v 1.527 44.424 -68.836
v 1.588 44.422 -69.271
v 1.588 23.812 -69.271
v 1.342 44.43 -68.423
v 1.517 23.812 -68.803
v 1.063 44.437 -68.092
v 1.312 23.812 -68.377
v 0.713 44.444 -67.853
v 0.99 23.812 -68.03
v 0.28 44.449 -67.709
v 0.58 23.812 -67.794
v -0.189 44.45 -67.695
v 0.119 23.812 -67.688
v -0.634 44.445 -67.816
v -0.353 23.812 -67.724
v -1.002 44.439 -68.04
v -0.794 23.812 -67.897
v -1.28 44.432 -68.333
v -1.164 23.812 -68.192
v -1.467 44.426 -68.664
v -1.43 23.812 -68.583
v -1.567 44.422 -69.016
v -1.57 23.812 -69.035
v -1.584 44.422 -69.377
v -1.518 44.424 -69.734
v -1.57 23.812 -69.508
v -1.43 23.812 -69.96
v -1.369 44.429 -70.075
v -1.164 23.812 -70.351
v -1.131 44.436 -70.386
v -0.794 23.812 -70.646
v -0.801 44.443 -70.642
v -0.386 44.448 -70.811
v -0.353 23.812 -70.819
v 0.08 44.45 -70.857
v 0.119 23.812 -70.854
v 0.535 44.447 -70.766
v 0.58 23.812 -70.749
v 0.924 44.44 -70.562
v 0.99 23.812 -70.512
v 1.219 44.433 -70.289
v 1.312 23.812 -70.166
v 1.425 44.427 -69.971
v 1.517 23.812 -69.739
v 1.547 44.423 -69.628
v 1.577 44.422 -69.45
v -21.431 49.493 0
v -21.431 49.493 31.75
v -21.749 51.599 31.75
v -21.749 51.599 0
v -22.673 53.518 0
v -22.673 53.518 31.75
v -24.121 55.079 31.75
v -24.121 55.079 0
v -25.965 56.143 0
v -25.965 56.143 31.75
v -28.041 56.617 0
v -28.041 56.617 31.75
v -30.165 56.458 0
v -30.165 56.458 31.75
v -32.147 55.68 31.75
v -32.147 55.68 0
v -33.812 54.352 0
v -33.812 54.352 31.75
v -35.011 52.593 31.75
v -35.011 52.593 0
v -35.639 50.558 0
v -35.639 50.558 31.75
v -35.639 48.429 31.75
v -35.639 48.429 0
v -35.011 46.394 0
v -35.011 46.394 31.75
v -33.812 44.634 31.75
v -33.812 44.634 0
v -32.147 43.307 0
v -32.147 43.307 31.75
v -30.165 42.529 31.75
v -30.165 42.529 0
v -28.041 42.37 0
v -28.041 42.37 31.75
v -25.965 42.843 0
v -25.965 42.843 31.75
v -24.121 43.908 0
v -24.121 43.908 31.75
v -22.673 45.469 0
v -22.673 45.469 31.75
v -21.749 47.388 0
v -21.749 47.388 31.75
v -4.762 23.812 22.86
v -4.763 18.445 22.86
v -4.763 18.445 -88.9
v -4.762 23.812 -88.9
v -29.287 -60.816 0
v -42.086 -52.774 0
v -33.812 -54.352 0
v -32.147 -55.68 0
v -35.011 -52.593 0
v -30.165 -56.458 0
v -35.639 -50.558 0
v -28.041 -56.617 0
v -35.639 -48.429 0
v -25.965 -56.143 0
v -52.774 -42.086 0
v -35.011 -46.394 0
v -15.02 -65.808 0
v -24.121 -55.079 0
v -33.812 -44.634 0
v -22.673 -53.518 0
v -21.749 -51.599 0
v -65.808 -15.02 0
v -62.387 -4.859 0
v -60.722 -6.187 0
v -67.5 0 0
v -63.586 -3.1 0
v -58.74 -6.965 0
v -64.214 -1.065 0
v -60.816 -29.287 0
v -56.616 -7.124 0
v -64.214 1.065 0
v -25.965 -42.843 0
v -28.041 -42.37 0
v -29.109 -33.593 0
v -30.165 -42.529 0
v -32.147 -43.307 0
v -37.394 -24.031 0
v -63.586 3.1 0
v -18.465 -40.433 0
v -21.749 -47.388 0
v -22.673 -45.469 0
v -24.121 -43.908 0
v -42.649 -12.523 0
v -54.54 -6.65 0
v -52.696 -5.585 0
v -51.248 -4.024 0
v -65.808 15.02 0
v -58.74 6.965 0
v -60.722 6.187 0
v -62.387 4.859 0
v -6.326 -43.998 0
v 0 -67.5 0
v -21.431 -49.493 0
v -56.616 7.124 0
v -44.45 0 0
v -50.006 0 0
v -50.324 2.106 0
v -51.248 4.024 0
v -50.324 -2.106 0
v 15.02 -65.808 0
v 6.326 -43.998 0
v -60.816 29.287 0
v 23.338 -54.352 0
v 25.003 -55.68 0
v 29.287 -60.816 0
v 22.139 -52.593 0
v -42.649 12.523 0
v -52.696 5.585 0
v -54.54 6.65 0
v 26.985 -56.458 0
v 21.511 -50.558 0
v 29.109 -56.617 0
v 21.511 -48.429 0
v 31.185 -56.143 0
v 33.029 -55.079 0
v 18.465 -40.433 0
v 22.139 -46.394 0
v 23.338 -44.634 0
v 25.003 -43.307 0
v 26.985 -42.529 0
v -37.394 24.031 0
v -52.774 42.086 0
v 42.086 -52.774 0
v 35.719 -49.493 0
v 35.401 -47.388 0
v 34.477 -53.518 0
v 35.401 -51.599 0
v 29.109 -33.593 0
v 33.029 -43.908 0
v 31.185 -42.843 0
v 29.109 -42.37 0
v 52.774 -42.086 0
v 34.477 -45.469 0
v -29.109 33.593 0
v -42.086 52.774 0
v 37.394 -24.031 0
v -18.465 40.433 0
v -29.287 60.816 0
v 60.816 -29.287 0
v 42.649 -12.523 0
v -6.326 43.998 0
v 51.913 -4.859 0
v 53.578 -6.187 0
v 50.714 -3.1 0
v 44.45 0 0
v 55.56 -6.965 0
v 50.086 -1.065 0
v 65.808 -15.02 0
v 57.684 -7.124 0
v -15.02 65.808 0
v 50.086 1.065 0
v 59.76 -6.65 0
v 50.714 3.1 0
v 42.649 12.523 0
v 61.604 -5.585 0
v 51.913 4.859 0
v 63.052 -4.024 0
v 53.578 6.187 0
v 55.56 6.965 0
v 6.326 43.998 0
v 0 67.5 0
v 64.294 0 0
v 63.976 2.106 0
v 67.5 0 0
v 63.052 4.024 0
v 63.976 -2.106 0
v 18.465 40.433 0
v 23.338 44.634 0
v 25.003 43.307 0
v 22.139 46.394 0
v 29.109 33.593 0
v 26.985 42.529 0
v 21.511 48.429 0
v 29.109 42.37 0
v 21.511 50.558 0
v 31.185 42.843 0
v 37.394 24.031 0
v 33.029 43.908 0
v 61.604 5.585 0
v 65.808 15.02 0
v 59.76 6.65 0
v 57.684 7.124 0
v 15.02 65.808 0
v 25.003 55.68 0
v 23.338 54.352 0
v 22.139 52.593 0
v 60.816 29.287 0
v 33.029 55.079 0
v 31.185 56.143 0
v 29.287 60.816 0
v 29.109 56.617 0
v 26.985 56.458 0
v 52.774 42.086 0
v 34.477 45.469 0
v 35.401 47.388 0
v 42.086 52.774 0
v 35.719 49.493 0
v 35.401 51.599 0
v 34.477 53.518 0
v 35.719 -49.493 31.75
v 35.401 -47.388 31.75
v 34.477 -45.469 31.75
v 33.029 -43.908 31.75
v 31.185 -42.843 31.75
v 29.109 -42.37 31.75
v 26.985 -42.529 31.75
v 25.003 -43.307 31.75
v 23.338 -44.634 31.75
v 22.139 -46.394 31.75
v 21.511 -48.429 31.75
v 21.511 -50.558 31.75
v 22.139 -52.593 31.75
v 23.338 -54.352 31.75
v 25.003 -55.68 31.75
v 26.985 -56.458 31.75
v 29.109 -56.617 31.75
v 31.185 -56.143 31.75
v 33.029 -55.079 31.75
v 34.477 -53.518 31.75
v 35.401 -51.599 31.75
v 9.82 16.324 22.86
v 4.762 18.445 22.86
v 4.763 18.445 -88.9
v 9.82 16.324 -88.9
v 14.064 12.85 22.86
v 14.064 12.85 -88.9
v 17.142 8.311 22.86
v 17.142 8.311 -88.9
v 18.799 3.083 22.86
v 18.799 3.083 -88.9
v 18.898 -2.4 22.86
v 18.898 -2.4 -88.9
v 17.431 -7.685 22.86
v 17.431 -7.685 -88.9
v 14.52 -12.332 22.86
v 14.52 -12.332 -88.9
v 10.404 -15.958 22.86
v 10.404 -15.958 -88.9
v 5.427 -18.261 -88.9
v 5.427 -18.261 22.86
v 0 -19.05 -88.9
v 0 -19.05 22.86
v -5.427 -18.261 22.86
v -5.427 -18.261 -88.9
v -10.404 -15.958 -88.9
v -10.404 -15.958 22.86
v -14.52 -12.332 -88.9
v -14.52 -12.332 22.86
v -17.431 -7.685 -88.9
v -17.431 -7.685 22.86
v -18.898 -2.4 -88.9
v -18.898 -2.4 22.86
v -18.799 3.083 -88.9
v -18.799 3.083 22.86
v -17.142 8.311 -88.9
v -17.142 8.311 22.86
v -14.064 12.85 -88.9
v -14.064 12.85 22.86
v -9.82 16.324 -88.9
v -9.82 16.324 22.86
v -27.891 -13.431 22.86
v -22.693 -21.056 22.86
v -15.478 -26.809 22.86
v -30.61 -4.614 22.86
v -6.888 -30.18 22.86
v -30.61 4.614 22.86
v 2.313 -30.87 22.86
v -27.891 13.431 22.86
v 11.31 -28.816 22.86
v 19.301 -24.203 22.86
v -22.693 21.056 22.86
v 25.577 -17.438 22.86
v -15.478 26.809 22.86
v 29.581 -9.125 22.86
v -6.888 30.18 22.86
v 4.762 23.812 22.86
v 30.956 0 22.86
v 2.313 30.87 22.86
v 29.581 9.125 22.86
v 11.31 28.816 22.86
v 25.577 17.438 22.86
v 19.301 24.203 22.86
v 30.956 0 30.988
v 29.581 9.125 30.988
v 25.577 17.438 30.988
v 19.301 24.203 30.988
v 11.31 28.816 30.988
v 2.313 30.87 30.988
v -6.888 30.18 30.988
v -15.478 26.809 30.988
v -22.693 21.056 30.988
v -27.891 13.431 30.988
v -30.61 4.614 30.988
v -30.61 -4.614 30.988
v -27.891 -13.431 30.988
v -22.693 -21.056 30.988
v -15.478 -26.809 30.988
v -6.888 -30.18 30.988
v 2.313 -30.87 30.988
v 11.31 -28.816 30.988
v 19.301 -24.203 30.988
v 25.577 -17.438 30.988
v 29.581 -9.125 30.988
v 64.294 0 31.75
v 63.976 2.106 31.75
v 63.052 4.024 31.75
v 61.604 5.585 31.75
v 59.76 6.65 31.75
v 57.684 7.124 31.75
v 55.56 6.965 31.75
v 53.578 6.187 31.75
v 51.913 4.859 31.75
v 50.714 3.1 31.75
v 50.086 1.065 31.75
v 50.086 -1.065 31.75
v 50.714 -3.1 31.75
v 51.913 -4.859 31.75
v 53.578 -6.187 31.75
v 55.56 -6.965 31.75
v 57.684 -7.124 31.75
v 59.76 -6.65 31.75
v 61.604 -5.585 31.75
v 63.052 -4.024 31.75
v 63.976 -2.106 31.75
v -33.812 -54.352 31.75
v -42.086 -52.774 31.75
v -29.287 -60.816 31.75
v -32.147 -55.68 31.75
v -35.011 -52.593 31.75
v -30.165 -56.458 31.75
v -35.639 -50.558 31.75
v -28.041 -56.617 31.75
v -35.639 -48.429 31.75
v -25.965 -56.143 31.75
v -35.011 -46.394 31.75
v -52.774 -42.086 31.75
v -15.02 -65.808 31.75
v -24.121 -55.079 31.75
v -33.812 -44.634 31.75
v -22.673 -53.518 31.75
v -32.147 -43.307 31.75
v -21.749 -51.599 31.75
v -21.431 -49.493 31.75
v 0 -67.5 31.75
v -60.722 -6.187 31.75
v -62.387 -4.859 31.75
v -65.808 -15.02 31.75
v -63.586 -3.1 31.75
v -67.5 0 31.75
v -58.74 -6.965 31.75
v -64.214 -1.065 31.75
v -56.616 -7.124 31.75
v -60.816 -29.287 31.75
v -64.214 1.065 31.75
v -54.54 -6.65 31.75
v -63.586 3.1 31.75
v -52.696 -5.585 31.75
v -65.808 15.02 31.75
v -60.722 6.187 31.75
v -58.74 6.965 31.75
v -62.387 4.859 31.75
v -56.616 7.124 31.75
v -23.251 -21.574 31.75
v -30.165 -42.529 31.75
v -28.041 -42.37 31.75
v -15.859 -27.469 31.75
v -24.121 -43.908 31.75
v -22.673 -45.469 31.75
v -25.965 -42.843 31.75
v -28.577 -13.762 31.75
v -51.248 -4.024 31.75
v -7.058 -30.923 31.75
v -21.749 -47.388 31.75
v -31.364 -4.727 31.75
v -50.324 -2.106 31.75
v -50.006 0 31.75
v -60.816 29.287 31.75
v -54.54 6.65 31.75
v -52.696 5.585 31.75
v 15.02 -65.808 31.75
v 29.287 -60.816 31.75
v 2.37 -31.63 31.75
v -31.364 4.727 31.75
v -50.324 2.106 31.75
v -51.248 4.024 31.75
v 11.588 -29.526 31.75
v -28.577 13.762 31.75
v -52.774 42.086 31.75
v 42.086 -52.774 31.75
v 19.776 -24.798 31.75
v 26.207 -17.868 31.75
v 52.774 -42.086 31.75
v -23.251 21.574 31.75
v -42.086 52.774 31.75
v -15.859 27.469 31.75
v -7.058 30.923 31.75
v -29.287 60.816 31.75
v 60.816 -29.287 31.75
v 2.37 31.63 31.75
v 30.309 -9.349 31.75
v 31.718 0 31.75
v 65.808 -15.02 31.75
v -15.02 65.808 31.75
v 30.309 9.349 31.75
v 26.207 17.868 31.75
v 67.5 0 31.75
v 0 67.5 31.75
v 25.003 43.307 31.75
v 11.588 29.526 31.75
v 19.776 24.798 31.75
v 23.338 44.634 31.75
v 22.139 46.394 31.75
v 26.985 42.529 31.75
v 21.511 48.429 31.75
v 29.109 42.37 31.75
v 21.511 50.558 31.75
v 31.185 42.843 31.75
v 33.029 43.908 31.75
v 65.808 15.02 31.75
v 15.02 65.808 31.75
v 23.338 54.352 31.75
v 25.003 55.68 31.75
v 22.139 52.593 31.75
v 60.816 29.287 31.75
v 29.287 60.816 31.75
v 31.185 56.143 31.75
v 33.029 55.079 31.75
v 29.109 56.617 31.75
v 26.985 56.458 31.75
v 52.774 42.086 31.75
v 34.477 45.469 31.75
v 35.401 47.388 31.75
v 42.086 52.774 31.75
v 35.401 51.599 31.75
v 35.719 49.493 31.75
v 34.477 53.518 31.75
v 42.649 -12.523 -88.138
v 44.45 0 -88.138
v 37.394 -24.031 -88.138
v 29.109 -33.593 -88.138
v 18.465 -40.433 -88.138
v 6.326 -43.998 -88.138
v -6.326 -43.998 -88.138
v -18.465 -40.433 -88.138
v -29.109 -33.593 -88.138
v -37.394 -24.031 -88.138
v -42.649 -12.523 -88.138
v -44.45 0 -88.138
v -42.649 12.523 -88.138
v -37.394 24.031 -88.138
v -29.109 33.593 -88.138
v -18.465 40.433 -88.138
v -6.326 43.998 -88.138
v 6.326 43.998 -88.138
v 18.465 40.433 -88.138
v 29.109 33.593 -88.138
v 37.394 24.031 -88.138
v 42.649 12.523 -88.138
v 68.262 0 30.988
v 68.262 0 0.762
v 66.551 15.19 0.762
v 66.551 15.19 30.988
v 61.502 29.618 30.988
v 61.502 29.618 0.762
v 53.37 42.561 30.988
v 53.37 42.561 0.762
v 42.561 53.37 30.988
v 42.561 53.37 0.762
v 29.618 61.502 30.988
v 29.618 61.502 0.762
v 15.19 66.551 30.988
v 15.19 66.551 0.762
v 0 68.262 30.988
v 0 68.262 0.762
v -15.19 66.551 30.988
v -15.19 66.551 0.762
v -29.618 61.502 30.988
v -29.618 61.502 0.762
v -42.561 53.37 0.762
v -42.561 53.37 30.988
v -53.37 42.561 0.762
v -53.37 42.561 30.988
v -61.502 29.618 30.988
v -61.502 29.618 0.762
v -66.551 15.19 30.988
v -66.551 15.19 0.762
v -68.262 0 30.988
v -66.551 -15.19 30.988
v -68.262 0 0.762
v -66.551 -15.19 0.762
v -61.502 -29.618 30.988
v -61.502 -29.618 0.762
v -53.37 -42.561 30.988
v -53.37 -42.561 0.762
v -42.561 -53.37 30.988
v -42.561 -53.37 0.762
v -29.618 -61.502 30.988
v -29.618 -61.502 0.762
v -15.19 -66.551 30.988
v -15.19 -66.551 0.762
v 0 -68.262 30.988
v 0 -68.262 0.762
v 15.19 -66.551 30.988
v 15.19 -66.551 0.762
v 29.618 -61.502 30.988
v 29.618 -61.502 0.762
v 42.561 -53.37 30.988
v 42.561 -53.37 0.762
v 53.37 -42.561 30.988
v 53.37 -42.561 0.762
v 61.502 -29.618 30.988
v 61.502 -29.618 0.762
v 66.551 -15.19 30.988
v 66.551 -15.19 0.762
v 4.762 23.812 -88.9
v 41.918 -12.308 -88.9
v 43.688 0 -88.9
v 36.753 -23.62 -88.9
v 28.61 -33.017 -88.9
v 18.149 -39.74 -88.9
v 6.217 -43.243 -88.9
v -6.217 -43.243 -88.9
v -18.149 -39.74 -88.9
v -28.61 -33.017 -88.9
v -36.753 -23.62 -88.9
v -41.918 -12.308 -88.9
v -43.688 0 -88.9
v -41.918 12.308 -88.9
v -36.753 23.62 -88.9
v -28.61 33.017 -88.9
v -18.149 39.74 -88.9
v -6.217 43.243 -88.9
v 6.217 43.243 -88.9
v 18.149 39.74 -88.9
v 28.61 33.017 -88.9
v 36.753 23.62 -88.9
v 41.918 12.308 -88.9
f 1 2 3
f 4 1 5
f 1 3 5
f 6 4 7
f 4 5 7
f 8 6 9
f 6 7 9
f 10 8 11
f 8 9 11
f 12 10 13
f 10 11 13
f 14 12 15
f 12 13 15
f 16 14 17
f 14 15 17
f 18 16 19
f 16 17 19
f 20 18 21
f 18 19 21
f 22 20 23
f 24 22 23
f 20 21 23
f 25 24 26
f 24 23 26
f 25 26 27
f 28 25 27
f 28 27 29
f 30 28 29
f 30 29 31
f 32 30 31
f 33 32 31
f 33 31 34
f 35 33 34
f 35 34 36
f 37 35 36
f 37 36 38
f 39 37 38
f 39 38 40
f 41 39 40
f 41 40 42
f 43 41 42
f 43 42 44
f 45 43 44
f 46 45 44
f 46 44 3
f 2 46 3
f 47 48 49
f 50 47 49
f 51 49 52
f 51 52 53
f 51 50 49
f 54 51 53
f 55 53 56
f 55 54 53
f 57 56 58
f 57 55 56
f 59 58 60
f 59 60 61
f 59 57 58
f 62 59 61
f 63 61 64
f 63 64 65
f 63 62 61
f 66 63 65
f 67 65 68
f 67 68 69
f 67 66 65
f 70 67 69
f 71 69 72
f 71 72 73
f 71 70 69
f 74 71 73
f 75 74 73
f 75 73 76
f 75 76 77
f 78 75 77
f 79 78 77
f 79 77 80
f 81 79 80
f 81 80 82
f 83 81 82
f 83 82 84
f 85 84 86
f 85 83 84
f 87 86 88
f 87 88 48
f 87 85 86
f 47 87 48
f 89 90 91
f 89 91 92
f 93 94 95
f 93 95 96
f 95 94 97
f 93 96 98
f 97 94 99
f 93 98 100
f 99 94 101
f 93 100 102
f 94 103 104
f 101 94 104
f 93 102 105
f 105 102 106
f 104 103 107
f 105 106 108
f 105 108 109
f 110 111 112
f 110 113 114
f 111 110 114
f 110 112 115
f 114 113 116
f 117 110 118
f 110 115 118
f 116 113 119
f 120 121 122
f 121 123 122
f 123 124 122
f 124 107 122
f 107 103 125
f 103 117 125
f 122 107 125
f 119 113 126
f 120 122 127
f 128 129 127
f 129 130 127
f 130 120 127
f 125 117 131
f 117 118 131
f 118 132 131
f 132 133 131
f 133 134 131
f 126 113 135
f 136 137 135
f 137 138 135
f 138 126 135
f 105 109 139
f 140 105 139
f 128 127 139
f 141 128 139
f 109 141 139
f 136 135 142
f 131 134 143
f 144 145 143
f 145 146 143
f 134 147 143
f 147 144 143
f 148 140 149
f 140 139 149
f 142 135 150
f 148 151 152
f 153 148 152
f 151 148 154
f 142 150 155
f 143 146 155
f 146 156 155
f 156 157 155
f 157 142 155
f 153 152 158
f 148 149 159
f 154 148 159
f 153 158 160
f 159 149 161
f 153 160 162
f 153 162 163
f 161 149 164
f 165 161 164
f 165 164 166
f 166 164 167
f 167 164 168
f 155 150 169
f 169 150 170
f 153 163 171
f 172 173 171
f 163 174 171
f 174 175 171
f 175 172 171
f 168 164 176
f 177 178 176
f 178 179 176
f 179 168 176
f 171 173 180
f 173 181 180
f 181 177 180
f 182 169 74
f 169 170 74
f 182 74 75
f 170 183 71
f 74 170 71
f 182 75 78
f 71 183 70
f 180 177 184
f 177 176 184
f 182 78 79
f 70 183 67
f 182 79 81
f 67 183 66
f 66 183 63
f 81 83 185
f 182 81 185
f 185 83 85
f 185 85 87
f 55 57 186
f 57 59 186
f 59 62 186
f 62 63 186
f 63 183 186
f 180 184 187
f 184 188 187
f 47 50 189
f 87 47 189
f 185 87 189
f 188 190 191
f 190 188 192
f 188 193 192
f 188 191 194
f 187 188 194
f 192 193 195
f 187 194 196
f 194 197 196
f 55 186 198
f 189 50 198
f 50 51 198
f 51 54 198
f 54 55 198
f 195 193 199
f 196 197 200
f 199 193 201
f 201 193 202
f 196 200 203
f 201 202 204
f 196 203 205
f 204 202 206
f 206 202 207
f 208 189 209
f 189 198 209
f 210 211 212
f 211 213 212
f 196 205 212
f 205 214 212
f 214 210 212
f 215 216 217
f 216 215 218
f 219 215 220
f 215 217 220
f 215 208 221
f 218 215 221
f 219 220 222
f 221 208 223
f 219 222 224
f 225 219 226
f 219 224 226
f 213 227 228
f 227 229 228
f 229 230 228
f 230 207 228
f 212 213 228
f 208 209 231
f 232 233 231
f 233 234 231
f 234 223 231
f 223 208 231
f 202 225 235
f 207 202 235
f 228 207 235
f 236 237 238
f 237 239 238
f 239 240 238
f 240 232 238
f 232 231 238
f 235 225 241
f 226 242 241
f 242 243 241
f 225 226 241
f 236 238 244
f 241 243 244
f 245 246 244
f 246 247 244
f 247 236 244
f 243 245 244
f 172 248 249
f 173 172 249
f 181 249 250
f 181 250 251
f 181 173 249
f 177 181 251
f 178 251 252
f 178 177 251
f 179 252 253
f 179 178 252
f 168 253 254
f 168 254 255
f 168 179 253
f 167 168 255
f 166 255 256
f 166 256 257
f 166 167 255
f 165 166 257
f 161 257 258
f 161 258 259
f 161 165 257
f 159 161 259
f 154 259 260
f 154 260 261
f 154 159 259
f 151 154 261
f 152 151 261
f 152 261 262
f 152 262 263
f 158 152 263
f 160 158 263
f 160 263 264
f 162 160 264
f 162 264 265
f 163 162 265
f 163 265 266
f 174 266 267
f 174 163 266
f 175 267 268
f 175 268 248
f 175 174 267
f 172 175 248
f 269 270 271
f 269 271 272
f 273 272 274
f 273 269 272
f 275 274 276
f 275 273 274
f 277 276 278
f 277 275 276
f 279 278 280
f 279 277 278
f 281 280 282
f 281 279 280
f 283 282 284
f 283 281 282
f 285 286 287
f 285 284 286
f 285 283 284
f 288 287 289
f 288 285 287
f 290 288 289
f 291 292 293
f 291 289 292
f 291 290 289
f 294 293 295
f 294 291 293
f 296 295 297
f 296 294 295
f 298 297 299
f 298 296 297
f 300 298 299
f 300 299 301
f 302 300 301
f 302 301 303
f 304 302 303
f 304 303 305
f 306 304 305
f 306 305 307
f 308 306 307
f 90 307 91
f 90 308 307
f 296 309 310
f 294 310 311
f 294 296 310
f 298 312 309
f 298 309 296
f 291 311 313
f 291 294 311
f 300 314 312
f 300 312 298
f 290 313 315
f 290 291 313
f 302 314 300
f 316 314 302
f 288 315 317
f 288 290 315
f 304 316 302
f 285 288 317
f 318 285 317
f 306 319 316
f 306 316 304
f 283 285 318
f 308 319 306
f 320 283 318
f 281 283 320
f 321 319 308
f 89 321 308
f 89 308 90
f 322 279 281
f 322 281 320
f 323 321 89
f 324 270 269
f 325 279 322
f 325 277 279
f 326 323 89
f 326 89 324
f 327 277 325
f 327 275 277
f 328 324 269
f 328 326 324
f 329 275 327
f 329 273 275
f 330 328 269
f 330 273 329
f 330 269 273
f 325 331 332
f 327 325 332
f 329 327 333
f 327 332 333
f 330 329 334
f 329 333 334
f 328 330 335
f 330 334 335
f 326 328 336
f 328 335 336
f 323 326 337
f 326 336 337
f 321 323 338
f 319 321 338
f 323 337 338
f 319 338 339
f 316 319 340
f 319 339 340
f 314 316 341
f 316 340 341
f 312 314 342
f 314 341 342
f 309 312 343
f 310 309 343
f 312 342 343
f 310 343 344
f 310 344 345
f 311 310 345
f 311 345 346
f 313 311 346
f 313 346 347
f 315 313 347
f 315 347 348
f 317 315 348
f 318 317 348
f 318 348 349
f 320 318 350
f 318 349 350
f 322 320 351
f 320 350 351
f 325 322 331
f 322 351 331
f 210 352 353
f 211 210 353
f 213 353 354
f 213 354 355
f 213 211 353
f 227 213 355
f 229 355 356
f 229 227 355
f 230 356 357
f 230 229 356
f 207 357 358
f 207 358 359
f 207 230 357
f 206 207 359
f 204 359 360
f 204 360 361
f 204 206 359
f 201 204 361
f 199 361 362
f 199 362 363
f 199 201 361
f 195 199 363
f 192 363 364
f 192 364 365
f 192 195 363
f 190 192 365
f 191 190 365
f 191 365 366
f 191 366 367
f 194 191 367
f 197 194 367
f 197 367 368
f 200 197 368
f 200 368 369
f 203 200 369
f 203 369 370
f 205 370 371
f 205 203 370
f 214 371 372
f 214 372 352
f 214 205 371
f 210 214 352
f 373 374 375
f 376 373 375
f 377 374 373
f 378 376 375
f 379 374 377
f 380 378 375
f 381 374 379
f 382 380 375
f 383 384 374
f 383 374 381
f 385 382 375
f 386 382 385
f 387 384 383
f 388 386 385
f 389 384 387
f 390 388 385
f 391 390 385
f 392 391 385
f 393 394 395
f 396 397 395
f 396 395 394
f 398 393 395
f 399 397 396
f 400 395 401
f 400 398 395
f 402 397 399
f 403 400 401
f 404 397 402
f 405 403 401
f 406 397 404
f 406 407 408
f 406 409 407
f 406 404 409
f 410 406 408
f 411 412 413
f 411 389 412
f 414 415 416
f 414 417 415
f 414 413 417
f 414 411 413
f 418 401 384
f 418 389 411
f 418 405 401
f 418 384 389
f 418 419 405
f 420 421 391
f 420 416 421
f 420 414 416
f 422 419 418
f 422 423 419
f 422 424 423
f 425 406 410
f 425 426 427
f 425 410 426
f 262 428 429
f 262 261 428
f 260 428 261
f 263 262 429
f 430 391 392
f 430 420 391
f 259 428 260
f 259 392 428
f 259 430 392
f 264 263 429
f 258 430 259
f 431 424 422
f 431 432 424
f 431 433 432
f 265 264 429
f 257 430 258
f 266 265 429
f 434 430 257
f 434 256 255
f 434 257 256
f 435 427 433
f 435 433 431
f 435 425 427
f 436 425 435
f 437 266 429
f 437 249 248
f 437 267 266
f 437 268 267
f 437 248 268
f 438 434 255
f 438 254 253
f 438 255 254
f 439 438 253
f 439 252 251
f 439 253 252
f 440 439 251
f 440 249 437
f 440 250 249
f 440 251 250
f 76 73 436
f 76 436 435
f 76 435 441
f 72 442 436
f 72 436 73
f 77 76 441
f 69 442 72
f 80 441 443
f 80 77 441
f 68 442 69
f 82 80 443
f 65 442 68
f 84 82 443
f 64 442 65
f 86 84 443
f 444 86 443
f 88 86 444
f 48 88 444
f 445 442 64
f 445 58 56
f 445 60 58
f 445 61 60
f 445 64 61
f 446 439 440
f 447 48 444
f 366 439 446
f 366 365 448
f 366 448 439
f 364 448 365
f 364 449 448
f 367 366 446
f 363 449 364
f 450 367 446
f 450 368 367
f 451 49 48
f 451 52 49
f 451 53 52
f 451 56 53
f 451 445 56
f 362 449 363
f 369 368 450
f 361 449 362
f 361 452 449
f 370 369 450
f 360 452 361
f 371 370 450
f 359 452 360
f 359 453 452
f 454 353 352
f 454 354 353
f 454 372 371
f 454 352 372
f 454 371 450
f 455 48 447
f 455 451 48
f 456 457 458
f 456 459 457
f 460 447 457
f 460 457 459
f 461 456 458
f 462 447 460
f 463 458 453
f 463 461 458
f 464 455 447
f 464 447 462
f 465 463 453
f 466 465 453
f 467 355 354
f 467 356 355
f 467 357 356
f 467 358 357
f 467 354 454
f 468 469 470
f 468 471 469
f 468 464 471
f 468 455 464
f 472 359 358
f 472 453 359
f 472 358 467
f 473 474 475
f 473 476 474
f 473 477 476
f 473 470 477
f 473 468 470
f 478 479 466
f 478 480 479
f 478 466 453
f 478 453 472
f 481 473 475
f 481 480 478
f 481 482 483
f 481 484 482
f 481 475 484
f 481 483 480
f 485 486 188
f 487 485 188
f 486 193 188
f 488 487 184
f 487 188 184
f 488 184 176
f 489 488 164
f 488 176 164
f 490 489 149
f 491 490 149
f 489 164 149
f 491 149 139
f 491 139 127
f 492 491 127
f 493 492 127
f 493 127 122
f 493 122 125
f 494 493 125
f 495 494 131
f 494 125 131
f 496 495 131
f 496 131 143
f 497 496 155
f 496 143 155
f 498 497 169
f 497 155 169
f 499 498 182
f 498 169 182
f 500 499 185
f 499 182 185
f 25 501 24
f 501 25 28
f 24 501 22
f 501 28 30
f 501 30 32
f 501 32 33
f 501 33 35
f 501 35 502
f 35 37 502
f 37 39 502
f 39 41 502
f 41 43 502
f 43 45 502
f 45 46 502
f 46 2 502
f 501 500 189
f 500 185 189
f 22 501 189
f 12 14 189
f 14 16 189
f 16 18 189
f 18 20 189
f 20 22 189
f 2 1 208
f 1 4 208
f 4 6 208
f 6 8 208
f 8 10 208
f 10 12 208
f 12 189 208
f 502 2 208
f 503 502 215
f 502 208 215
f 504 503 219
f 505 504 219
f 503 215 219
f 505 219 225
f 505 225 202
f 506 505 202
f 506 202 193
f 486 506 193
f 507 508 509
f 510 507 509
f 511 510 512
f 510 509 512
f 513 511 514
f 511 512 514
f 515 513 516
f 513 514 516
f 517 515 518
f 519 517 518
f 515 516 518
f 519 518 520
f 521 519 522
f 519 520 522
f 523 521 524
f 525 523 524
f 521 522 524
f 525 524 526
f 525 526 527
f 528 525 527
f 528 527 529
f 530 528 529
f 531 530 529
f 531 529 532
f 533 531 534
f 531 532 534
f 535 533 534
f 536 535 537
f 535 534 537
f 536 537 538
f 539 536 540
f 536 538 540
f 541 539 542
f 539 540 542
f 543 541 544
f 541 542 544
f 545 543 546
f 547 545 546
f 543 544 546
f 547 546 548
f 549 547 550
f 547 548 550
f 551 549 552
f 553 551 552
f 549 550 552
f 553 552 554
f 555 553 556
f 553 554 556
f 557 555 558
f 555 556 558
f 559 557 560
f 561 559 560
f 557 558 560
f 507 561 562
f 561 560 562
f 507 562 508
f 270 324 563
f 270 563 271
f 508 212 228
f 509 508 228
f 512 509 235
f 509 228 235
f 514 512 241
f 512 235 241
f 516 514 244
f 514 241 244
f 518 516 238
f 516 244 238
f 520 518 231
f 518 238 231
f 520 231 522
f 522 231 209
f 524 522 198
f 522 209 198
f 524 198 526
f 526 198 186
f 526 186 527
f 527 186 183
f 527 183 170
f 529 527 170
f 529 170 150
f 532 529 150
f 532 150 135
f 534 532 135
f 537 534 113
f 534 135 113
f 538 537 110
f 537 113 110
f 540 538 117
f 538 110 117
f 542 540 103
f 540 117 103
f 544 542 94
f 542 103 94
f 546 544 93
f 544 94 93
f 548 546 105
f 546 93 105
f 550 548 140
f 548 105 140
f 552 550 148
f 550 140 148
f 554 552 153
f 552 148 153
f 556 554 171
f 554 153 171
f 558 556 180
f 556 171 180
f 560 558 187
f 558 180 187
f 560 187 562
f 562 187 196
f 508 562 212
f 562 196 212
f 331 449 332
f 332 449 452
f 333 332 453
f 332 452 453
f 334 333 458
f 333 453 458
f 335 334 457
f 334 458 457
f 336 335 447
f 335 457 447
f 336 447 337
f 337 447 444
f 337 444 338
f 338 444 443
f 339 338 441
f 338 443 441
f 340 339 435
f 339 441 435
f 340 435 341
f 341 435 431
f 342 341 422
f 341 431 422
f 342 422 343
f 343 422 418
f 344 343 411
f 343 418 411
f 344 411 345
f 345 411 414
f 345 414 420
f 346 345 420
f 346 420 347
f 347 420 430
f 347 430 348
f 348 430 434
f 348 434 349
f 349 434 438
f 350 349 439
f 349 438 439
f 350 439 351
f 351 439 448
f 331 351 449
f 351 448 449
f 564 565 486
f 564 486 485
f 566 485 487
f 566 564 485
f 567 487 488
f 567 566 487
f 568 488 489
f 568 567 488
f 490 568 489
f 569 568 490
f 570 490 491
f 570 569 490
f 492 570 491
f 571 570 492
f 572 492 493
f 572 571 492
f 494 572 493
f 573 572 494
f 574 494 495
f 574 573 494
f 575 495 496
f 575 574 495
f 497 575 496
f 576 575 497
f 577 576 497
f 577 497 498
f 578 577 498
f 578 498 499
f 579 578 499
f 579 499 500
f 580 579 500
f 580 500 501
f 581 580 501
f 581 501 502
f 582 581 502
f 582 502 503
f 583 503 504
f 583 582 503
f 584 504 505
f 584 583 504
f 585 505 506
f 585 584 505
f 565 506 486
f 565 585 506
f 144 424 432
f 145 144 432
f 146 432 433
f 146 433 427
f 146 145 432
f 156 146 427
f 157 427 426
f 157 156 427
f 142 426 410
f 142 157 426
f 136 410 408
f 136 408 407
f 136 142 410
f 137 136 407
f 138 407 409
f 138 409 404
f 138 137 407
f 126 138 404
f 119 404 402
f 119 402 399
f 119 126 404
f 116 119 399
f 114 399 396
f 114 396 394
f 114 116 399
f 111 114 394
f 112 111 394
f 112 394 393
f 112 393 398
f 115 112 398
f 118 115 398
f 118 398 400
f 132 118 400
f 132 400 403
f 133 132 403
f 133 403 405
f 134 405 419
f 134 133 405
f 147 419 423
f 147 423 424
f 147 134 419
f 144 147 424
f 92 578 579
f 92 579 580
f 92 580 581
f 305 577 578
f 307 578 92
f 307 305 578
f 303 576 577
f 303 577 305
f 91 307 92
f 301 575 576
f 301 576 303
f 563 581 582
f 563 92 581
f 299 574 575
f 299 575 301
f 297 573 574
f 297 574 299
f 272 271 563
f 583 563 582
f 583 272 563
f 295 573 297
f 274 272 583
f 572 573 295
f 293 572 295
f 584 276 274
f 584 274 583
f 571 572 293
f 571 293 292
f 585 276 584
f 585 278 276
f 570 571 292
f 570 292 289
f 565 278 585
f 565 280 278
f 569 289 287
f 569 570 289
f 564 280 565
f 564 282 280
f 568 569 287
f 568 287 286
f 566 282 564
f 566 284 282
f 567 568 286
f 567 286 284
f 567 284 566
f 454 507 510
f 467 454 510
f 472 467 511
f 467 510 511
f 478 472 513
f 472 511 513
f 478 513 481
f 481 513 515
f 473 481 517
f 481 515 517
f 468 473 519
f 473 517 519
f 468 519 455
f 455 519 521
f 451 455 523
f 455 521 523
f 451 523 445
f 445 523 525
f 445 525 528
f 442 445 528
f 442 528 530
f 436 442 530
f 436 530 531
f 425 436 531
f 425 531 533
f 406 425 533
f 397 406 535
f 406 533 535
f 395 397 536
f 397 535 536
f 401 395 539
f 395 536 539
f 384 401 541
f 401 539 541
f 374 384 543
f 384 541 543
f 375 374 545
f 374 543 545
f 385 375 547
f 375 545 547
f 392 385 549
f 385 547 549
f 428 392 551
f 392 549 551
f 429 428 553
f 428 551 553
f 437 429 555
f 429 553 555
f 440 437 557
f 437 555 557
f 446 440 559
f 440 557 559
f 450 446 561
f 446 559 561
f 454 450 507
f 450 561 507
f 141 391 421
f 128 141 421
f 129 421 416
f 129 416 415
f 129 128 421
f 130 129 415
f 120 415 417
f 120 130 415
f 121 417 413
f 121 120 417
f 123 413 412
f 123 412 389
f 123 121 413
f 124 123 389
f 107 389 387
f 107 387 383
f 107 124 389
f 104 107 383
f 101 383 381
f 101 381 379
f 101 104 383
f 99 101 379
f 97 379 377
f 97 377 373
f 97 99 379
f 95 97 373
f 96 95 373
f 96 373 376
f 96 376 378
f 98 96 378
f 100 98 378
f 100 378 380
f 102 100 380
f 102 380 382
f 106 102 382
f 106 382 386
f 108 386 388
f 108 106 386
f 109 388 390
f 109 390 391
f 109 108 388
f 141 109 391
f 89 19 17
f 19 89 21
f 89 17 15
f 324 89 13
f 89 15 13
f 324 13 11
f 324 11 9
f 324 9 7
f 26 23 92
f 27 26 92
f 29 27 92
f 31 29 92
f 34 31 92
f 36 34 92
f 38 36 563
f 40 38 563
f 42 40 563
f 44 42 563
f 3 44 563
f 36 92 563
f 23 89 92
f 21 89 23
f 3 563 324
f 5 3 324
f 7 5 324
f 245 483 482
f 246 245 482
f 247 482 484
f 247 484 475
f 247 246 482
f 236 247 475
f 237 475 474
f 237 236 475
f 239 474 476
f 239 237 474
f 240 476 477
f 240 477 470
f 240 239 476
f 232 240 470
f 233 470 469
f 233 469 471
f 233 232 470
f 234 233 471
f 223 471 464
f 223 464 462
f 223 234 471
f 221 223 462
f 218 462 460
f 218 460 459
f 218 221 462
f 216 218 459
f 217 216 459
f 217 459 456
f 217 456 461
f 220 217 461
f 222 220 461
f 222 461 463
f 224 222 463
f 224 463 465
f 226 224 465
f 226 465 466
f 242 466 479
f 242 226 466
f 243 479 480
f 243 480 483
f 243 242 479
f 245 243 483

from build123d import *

# Parameters (mm, degrees)
F0_R      = 68.2625
F0_R_2    = 7.14375
F0_R_3    = 19.05
F1_DEPTH  = 31.75
F2_R      = 30.95625
F3_DEPTH  = 8.89
F4_R      = 44.45
F4_R_2    = 19.05
F5_DEPTH  = 88.9
F7_DEPTH  = 120.651
F8_SIZE   = 0.762
F9_R      = 1.5875
F10_DEPTH = 76.2


with BuildPart() as f1:
    # F0 (on Top) → F1 (new body)
    with BuildSketch(Plane.XY):
        Circle(F0_R)
        with Locations((-28.575, -49.493352)):
            Circle(F0_R_2, mode=Mode.SUBTRACT)
        with Locations((28.575, -49.493352)):
            Circle(F0_R_2, mode=Mode.SUBTRACT)
        with Locations((-57.15, 0)):
            Circle(F0_R_2, mode=Mode.SUBTRACT)
        with Locations((-28.575, 49.493352)):
            Circle(F0_R_2, mode=Mode.SUBTRACT)
        Circle(F0_R_3, mode=Mode.SUBTRACT)
        with Locations((57.15, 0)):
            Circle(F0_R_2, mode=Mode.SUBTRACT)
        with Locations((28.575, 49.493352)):
            Circle(F0_R_2, mode=Mode.SUBTRACT)
    extrude(amount=F1_DEPTH)

    # F2 (on face) → F3 (cut)
    with BuildSketch(Plane.XY.offset(31.75)):
        Circle(F2_R)
    extrude(amount=-F3_DEPTH, mode=Mode.SUBTRACT)

    # F4 (on face) → F5 (join)
    with BuildSketch(Plane(origin=(0, 0, 0), x_dir=(1, 0, 0), z_dir=(0, 0, -1))):
        Circle(F4_R)
        Circle(F4_R_2, mode=Mode.SUBTRACT)
    extrude(amount=F5_DEPTH)

    # F6 (on face) → F7 (cut, through all)
    with BuildSketch(Plane(origin=(0, 0, -88.9), x_dir=(1, 0, 0), z_dir=(0, 0, -1))):
        Polygon((4.7625, -10.517543), (0, -10.517543), (0, -19.05), (0, -23.8125), (4.7625, -23.8125), align=None)
        Polygon((0, -19.05), (0, -10.517543), (-4.7625, -10.517543), (-4.7625, -23.8125), (0, -23.8125), align=None)
    extrude(amount=-F7_DEPTH, mode=Mode.SUBTRACT)

    # F8
    f8_edges = [f1.edges().sort_by_distance(p)[0] for p in [
        (-68.2625, 0, 31.75),
        (-68.2625, 0, 0),
        (-30.95625, 0, 31.75),
        (-44.45, 0, -88.9),
    ]]
    chamfer(f8_edges, length=F8_SIZE)

    # F9 (on Front) → F10 (cut)
    with BuildSketch(Plane.XZ):
        with Locations((0, -69.271334)):
            Circle(F9_R)
    extrude(amount=-F10_DEPTH, mode=Mode.SUBTRACT)


solid = f1.part
